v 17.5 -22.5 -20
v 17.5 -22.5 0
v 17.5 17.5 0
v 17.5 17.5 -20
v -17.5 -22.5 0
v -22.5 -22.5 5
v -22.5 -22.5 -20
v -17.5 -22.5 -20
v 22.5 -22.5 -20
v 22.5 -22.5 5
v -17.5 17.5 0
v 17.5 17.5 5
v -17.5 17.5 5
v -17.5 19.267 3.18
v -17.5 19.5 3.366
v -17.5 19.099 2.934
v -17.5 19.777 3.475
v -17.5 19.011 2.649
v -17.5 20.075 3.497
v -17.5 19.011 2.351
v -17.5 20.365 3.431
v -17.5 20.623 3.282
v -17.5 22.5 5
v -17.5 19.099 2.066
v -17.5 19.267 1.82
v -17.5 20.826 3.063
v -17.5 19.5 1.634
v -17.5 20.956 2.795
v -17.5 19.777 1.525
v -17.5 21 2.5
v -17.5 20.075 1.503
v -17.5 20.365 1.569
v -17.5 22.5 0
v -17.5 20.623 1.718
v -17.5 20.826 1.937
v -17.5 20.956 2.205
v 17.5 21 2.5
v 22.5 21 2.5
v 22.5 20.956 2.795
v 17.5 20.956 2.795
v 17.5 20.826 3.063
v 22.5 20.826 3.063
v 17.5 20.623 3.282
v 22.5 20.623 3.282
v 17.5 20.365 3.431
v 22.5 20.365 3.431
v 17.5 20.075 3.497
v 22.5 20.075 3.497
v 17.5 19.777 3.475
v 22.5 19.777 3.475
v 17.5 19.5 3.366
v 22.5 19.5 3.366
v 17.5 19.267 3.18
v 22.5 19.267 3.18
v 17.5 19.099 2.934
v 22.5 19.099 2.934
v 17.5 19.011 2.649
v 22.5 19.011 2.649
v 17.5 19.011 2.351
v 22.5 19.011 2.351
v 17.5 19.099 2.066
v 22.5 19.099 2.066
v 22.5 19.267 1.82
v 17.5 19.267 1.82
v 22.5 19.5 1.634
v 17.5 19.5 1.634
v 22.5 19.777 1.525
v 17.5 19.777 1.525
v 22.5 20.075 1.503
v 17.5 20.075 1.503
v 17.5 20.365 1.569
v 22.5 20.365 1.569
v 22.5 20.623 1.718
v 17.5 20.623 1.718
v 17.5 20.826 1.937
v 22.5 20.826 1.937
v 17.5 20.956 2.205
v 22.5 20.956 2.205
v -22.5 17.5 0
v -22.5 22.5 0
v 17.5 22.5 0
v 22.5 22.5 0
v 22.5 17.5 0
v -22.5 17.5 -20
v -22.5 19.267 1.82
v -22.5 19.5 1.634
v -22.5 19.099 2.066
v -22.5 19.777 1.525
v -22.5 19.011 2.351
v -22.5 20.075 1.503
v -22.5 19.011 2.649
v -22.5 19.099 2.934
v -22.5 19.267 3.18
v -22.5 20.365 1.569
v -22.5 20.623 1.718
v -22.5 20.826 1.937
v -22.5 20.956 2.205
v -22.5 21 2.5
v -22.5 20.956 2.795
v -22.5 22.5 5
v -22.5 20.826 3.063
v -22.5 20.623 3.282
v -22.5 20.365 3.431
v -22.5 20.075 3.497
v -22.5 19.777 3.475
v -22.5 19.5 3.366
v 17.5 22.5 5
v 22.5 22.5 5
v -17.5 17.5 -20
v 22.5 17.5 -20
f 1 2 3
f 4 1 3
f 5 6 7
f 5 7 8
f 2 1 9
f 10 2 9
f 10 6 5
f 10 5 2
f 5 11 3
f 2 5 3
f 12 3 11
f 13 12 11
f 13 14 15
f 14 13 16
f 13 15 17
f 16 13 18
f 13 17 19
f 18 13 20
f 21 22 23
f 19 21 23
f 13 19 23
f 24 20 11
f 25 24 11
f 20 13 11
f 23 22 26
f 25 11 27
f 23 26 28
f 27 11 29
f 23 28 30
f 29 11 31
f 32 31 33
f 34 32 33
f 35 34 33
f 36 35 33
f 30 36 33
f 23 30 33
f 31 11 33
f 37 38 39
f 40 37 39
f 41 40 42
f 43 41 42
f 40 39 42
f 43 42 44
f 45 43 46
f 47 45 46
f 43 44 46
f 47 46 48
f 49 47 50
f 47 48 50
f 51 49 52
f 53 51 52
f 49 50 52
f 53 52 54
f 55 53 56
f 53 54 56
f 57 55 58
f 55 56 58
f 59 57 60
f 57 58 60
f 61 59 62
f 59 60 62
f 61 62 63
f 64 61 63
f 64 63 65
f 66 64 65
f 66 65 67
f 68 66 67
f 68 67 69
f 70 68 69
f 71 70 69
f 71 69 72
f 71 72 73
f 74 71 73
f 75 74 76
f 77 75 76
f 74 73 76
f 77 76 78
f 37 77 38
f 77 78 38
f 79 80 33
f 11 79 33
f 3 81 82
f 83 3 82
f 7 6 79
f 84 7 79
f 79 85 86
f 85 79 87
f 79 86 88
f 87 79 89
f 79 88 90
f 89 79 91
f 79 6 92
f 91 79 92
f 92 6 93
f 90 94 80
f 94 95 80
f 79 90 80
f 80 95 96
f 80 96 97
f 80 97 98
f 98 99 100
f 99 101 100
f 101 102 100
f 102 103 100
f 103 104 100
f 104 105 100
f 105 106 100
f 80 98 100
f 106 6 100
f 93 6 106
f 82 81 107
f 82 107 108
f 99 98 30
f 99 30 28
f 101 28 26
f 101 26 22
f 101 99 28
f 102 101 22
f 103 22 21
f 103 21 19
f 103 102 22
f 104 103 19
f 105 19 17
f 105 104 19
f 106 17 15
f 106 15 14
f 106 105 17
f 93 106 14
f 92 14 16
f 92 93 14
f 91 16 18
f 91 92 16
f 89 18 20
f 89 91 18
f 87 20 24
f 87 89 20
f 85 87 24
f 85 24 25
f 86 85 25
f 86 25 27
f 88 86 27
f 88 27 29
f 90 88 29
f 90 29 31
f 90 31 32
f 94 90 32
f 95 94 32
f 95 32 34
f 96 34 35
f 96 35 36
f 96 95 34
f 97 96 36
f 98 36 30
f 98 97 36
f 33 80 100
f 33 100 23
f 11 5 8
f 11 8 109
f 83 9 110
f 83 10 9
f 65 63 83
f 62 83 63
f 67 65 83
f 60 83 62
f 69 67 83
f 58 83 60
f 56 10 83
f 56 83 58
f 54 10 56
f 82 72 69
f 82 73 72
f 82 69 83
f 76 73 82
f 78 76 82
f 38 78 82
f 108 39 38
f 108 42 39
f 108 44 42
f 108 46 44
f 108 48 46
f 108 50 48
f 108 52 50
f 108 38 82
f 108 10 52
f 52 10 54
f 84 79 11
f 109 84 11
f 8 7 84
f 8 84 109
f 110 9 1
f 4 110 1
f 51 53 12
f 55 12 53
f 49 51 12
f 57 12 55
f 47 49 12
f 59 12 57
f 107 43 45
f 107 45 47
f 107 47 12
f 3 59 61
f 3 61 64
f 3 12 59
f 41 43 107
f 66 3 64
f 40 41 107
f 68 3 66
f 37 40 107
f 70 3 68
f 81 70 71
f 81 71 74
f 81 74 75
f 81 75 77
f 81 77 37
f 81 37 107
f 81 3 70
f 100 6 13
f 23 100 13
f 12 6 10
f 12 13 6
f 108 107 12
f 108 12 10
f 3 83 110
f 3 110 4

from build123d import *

# Parameters (mm, degrees)
SKETCH_1_W          = 45
SKETCH_1_H          = 45
EXTRUDE_1_DEPTH     = 5
SKETCH_2_R          = 1
CUT_EXTRUDE_2_DEPTH = 5
SKETCH_3_W          = 35
SKETCH_3_H          = 5
CUT_EXTRUDE_3_DEPTH = 33.210246817
SKETCH_4_W          = 5
SKETCH_4_H          = 40
EXTRUDE_2_DEPTH     = 20


with BuildPart() as part:
    # 草圖1 → 填料-伸長1 (new body)
    with BuildSketch(Plane.XY):
        Rectangle(SKETCH_1_W, SKETCH_1_H)
    extrude(amount=EXTRUDE_1_DEPTH)

    # 草圖2 → 除料-伸長2 (cut)
    with BuildSketch(Plane(origin=(22.5, 0, 0), x_dir=(0, 0, -1), z_dir=(1, 0, 0))):
        with Locations(Location((-2.5, 20, 0), (0, 0, 90))):
            Circle(SKETCH_2_R)
    cut_extrude_2 = extrude(amount=-CUT_EXTRUDE_2_DEPTH, mode=Mode.SUBTRACT)

    # 草圖3 → 除料-伸長3 (cut, through all)
    with BuildSketch(Plane(origin=(0, 0, 0), x_dir=(-1, 0, 0), z_dir=(0, 0, -1))):
        with Locations((0, 20)):
            Rectangle(SKETCH_3_W, SKETCH_3_H)
    extrude(amount=-CUT_EXTRUDE_3_DEPTH, mode=Mode.SUBTRACT)

    # 鏡射1: 除料-伸長2 across plane
    add(cut_extrude_2.mirror(Plane(origin=(0, 0, 0), x_dir=(0, 0, 1), z_dir=(1, 0, 0))), mode=Mode.SUBTRACT)

    # 草圖4 → 填料-伸長2 (add)
    with BuildSketch(Plane(origin=(0, 0, 0), x_dir=(-1, 0, 0), z_dir=(0, 0, -1))):
        with Locations((-20, -2.5)):
            Rectangle(SKETCH_4_W, SKETCH_4_H)
    extrude_2 = extrude(amount=EXTRUDE_2_DEPTH)

    # 鏡射2: 填料-伸長2 across plane
    add(extrude_2.mirror(Plane(origin=(0, 0, 0), x_dir=(0, 0, 1), z_dir=(1, 0, 0))))


solid = part.part
